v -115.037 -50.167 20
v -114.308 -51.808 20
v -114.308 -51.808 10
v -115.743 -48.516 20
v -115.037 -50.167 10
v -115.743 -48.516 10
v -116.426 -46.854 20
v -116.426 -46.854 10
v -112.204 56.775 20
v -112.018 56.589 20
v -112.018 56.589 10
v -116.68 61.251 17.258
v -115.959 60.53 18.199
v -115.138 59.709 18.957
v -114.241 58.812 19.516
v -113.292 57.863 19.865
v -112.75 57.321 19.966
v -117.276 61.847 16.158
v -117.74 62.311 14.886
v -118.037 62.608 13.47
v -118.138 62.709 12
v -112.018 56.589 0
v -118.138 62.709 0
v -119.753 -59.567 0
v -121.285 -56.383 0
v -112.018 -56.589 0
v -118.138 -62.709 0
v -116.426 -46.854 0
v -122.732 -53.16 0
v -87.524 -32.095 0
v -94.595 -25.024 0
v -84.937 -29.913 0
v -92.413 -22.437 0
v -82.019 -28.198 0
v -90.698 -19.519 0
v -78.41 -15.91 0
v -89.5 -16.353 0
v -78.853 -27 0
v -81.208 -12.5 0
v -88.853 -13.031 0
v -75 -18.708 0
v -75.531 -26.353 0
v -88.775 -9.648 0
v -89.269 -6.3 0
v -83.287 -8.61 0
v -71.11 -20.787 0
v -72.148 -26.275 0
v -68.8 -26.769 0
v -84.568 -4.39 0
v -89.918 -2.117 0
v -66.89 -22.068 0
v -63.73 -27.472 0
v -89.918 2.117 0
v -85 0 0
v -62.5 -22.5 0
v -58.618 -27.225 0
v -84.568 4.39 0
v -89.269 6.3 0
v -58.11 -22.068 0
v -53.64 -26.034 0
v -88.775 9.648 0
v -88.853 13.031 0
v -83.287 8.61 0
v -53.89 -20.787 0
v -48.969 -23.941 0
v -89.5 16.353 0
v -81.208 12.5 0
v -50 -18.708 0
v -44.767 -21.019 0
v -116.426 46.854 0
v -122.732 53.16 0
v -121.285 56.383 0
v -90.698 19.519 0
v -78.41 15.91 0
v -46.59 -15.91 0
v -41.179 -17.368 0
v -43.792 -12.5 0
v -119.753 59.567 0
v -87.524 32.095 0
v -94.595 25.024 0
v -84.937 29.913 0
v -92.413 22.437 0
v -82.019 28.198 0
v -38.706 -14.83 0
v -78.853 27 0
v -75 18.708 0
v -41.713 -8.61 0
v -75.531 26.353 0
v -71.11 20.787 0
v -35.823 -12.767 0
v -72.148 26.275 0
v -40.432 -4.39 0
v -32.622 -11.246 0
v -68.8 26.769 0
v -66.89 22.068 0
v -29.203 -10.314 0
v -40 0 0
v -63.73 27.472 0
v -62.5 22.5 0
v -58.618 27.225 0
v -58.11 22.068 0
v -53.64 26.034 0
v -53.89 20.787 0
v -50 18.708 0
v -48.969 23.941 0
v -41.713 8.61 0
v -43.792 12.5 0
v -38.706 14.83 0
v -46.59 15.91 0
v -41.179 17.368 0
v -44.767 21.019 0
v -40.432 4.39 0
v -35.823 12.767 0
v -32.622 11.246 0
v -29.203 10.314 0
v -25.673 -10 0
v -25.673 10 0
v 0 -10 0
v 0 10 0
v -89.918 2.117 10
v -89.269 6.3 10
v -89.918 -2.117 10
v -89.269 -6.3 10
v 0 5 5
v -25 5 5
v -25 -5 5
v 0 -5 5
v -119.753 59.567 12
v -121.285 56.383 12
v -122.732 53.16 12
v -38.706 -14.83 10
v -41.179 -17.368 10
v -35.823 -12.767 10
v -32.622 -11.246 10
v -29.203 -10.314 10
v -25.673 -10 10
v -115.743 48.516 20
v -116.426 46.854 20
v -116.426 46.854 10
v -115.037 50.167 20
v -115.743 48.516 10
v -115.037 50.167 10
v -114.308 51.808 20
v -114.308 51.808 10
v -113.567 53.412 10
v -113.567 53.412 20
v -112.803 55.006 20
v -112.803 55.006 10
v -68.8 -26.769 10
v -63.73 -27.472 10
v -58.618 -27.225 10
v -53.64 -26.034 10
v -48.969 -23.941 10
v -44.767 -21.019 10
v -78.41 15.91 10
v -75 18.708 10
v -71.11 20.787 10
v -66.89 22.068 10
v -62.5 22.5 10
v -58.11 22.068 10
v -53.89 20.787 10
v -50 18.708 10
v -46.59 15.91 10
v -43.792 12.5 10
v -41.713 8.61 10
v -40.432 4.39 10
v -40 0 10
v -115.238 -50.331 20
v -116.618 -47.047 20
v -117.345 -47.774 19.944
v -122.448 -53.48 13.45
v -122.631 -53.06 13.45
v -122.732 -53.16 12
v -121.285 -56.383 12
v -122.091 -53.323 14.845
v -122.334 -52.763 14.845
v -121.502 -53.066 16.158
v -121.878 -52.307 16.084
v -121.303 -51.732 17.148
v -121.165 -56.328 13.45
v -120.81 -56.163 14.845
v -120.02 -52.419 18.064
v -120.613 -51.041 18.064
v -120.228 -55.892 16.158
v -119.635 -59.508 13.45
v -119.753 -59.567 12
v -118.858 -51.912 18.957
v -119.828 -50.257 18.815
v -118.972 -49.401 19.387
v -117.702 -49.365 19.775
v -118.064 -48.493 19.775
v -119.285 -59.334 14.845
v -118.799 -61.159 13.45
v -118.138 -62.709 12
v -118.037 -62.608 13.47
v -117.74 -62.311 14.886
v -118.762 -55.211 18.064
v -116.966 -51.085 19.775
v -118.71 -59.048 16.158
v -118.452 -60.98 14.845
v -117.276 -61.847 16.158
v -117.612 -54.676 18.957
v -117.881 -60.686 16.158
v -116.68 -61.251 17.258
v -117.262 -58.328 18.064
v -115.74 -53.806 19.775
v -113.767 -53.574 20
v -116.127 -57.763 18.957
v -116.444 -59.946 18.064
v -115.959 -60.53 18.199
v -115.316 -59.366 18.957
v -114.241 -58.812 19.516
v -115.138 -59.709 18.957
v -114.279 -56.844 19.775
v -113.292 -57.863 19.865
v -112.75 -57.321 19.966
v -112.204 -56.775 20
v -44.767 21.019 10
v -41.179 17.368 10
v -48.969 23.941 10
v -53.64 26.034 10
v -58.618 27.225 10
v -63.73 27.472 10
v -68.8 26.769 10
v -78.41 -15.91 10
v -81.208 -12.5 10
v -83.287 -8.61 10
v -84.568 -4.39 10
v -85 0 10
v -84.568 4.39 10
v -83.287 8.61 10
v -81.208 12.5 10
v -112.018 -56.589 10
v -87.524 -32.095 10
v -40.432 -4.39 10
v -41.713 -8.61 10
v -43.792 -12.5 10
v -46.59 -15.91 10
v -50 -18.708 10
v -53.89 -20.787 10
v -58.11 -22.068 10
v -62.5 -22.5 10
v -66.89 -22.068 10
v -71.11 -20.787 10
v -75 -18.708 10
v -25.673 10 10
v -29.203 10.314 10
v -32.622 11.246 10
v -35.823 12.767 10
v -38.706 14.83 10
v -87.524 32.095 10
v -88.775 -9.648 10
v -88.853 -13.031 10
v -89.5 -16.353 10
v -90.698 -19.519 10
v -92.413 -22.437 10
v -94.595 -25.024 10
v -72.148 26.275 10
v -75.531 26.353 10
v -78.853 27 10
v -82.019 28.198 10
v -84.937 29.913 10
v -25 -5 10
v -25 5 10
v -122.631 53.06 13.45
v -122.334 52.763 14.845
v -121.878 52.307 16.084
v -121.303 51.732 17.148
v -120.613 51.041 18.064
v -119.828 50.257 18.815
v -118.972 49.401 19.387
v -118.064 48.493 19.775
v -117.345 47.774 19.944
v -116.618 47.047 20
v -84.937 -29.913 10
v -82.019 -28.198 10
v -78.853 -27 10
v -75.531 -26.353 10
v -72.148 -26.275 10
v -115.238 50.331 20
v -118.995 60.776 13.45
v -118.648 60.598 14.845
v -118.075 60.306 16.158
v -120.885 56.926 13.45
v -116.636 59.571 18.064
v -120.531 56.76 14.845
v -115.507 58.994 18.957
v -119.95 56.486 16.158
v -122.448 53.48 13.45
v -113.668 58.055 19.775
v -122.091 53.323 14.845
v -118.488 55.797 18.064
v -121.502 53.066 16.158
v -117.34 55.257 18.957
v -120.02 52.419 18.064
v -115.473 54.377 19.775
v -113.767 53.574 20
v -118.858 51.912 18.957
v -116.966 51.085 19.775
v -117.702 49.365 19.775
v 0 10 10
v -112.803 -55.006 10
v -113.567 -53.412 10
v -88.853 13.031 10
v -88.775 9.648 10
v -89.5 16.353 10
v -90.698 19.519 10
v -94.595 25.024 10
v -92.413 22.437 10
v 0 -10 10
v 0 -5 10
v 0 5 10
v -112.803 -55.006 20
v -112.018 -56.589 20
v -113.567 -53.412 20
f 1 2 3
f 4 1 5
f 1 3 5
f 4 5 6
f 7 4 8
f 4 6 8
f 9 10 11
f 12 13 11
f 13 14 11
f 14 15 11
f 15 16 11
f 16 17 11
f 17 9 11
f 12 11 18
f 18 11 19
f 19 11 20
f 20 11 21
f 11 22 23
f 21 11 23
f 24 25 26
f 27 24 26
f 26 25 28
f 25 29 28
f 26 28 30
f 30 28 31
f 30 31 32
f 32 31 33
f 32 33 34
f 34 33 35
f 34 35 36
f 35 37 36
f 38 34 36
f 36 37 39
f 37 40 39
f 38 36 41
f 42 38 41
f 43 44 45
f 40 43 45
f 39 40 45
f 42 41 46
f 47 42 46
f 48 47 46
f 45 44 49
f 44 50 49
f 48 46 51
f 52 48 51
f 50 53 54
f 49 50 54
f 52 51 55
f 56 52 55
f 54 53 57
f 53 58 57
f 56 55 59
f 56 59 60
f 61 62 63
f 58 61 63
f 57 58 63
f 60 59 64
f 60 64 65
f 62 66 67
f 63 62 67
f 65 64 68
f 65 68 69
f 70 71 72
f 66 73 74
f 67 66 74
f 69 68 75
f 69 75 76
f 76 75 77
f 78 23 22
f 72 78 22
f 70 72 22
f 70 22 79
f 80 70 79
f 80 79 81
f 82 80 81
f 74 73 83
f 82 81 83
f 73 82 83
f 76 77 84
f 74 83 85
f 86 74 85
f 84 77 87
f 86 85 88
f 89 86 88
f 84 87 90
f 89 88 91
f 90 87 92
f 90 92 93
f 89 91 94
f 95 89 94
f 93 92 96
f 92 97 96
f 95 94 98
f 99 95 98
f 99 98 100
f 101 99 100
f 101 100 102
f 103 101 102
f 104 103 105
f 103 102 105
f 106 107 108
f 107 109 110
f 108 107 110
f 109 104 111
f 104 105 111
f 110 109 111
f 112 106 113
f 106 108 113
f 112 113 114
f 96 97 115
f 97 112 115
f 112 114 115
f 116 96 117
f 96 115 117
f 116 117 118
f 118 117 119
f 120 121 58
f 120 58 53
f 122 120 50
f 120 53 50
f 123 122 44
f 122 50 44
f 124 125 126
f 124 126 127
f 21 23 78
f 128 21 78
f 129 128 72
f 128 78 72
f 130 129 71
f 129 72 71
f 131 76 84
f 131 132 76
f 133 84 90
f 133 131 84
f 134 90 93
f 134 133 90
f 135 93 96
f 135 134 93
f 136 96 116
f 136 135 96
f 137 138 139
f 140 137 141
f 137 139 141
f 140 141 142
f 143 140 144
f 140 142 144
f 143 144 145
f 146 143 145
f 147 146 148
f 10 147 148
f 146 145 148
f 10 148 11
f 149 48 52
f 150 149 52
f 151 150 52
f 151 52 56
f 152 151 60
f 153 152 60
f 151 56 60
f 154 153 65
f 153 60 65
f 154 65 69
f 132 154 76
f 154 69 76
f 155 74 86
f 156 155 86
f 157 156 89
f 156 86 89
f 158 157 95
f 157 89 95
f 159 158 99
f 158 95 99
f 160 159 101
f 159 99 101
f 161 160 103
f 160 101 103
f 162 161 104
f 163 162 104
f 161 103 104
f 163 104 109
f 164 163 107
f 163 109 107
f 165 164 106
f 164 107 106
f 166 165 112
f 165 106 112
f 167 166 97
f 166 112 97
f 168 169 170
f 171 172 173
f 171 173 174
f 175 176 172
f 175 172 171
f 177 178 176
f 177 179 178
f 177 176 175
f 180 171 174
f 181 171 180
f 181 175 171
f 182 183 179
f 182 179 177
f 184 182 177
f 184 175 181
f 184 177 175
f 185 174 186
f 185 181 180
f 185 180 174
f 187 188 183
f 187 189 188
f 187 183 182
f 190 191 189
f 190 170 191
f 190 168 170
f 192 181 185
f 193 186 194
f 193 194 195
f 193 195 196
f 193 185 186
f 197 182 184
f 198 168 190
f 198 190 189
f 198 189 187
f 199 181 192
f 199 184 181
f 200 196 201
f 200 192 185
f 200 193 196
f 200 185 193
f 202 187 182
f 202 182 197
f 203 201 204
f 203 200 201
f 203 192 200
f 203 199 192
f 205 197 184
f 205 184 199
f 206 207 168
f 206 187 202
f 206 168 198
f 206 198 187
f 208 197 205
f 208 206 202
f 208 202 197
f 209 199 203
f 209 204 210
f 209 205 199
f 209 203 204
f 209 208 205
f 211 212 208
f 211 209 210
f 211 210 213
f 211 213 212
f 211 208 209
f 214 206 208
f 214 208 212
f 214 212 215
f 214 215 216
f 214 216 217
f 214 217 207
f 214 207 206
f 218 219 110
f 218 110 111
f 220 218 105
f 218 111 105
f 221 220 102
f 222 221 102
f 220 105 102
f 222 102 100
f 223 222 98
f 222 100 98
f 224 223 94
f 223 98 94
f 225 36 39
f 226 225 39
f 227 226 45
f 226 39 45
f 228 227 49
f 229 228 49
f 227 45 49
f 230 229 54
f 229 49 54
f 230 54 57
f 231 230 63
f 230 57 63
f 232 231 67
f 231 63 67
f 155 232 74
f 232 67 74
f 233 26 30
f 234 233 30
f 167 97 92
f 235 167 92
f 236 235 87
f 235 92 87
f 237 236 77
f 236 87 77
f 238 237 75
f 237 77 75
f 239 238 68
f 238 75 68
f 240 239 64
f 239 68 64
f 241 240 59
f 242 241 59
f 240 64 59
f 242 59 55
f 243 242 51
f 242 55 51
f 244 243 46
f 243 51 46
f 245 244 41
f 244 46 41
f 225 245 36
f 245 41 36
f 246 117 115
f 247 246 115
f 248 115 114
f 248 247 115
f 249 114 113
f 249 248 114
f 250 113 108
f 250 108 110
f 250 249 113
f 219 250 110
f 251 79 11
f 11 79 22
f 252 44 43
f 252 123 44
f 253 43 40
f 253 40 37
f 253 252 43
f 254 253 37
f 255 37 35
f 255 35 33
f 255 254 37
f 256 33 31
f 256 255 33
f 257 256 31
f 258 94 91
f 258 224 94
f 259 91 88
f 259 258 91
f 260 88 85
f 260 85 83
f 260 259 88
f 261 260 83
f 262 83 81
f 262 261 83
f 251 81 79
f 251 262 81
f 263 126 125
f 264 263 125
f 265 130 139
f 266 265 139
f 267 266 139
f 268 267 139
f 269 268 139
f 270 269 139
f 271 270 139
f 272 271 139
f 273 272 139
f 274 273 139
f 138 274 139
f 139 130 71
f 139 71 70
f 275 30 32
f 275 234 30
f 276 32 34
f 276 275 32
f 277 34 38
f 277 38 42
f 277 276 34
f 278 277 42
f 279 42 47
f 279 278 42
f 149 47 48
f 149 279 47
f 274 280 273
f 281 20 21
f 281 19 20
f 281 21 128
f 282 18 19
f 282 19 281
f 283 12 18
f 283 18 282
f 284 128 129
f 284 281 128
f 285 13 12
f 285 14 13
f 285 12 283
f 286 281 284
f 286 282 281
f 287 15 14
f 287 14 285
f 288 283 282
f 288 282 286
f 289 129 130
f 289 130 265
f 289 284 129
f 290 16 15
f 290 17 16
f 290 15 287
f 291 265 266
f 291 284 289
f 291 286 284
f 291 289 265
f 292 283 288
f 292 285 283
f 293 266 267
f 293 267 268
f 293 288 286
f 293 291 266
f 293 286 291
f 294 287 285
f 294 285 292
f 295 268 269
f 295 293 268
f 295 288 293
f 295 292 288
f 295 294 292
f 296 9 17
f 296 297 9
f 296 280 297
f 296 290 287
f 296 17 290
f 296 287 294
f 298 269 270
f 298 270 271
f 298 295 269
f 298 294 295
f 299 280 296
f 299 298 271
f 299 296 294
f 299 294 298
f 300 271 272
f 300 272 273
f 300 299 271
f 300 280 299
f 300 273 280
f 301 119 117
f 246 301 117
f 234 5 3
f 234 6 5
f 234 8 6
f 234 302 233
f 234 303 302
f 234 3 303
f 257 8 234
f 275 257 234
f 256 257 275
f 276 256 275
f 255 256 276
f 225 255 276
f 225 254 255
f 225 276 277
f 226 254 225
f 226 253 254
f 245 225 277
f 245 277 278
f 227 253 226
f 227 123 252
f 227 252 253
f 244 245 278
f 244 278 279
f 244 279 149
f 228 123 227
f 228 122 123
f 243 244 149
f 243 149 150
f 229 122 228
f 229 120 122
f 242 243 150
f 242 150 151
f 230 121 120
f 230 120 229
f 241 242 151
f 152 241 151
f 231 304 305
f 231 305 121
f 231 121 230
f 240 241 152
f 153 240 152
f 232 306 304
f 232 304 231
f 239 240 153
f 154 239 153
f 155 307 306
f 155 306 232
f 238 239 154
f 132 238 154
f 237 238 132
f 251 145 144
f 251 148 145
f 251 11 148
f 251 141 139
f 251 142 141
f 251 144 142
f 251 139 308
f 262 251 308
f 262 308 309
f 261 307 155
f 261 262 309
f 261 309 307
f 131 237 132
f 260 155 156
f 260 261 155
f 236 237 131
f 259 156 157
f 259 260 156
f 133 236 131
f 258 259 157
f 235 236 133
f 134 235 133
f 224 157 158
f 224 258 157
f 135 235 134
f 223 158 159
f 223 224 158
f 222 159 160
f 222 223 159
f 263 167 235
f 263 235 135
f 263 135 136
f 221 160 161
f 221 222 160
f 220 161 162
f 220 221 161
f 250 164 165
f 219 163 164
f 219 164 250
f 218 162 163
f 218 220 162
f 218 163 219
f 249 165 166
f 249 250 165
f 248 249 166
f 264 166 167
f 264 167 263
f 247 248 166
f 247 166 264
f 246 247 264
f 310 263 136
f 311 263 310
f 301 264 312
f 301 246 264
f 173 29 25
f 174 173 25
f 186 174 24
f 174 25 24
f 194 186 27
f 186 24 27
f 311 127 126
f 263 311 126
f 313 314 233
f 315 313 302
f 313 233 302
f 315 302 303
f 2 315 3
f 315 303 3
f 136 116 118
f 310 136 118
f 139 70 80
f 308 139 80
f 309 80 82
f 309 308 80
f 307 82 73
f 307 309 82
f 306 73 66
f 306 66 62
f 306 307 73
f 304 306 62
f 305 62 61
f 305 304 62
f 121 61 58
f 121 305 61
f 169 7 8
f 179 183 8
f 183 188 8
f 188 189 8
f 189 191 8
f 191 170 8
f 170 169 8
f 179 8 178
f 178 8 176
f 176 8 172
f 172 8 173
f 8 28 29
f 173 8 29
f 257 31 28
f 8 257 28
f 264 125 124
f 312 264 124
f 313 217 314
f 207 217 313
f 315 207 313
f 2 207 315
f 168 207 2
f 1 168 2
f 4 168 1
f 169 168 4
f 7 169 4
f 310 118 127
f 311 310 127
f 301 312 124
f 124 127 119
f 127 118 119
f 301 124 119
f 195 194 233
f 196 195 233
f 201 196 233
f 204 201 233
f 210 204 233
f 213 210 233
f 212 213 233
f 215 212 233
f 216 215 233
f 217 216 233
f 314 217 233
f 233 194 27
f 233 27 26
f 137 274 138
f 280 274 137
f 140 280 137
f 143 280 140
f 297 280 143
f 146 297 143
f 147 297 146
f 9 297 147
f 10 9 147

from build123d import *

# Parameters (mm, degrees)
F1_DEPTH = 10
F2_R     = 20
F3_DEPTH = 20
F0_W     = 25
F0_H     = 10
F4_DEPTH = 5
F5_R     = 8


with BuildPart() as f1:
    # F0 (on Top) → F1 (new body)
    with BuildSketch(Plane.XY):
        with BuildLine():
            Line((0, 10), (-36.8826230851, 10))
            ThreePointArc((-36.8826230851, 10), (-35.4747537924, 5.0878352391), (-35, 0))
            ThreePointArc((-35, 0), (-35.4747537924, -5.0878352391), (-36.8826230851, -10))
            Line((-36.8826230851, -10), (0, -10))
            Line((0, -10), (0, -5))
            Line((0, -5), (-25, -5))
            Line((-25, -5), (-25, 5))
            Line((-25, 5), (0, 5))
            Line((0, 5), (0, 10))
        make_face()
        with BuildLine():
            Line((-114.3075854453, 51.8075854453), (-81.9454364826, 19.4454364826))
            ThreePointArc((-81.9454364826, 19.4454364826), (-80.0890590993, 21.1394181566), (-78.08578927, 22.6568570819))
            Line((-78.08578927, 22.6568570819), (-112.0176888624, 56.5887566742))
            ThreePointArc((-112.0176888624, 56.5887566742), (-113.1878851609, 54.2102633531), (-114.3075854453, 51.8075854453))
        make_face()
        with BuildLine():
            ThreePointArc((-85.1568570819, 15.58578927), (-83.6394181566, 17.5890590993), (-81.9454364826, 19.4454364826))
            Line((-81.9454364826, 19.4454364826), (-114.3075854453, 51.8075854453))
            ThreePointArc((-114.3075854453, 51.8075854453), (-115.3931446982, 49.3423971515), (-116.4255463439, 46.8544785321))
            Line((-116.4255463439, 46.8544785321), (-85.1568570819, 15.58578927))
        make_face()
        with BuildLine():
            ThreePointArc((-78.4099025767, 15.9099025767), (-53.8896227718, 20.7872894815), (-40, 0))
            ThreePointArc((-40, 0), (-53.8896227718, -20.7872894815), (-78.4099025767, -15.9099025767))
            Line((-78.4099025767, -15.9099025767), (-81.9454364826, -19.4454364826))
            ThreePointArc((-81.9454364826, -19.4454364826), (-80.0890590993, -21.1394181566), (-78.08578927, -22.6568570819))
            ThreePointArc((-78.08578927, -22.6568570819), (-54.424902758, -26.2876930242), (-36.8826230851, -10))
            ThreePointArc((-36.8826230851, -10), (-35.4747537924, -5.0878352391), (-35, 0))
            ThreePointArc((-35, 0), (-35.4747537924, 5.0878352391), (-36.8826230851, 10))
            ThreePointArc((-36.8826230851, 10), (-54.424902758, 26.2876930242), (-78.08578927, 22.6568570819))
            ThreePointArc((-78.08578927, 22.6568570819), (-80.0890590993, 21.1394181566), (-81.9454364826, 19.4454364826))
            Line((-81.9454364826, 19.4454364826), (-78.4099025767, 15.9099025767))
        make_face()
        with BuildLine():
            ThreePointArc((-78.4099025767, -15.9099025767), (-85, 0), (-78.4099025767, 15.9099025767))
            Line((-78.4099025767, 15.9099025767), (-81.9454364826, 19.4454364826))
            ThreePointArc((-81.9454364826, 19.4454364826), (-83.6394181566, 17.5890590993), (-85.1568570819, 15.58578927))
            ThreePointArc((-85.1568570819, 15.58578927), (-90, 0), (-85.1568570819, -15.58578927))
            ThreePointArc((-85.1568570819, -15.58578927), (-83.6394181566, -17.5890590993), (-81.9454364826, -19.4454364826))
            Line((-81.9454364826, -19.4454364826), (-78.4099025767, -15.9099025767))
        make_face()
        with BuildLine():
            Line((-114.3075854453, -51.8075854453), (-81.9454364826, -19.4454364826))
            ThreePointArc((-81.9454364826, -19.4454364826), (-83.6394181566, -17.5890590993), (-85.1568570819, -15.58578927))
            Line((-85.1568570819, -15.58578927), (-116.4255463439, -46.8544785321))
            ThreePointArc((-116.4255463439, -46.8544785321), (-115.3931446982, -49.3423971515), (-114.3075854453, -51.8075854453))
        make_face()
        with BuildLine():
            ThreePointArc((-78.08578927, -22.6568570819), (-80.0890590993, -21.1394181566), (-81.9454364826, -19.4454364826))
            Line((-81.9454364826, -19.4454364826), (-114.3075854453, -51.8075854453))
            ThreePointArc((-114.3075854453, -51.8075854453), (-113.1878851609, -54.2102633531), (-112.0176888624, -56.5887566742))
            Line((-112.0176888624, -56.5887566742), (-78.08578927, -22.6568570819))
        make_face()
        with BuildLine():
            ThreePointArc((-112.0176888624, -56.5887566742), (-113.1878851609, -54.2102633531), (-114.3075854453, -51.8075854453))
            ThreePointArc((-114.3075854453, -51.8075854453), (-115.3931446982, -49.3423971515), (-116.4255463439, -46.8544785321))
            Line((-116.4255463439, -46.8544785321), (-122.731528021, -53.1604602091))
            ThreePointArc((-122.731528021, -53.1604602091), (-120.5294282278, -57.98033659), (-118.1381334557, -62.7092012675))
            Line((-118.1381334557, -62.7092012675), (-112.0176888624, -56.5887566742))
        make_face()
        with BuildLine():
            ThreePointArc((-116.4255463439, 46.8544785321), (-115.3931446982, 49.3423971515), (-114.3075854453, 51.8075854453))
            ThreePointArc((-114.3075854453, 51.8075854453), (-113.1878851609, 54.2102633531), (-112.0176888624, 56.5887566742))
            Line((-112.0176888624, 56.5887566742), (-118.1381334557, 62.7092012675))
            ThreePointArc((-118.1381334557, 62.7092012675), (-120.5294282278, 57.98033659), (-122.731528021, 53.1604602091))
            Line((-122.731528021, 53.1604602091), (-116.4255463439, 46.8544785321))
        make_face()
    extrude(amount=F1_DEPTH)

    # F2
    f2_edges = [f1.edges().sort_by_distance(p)[0] for p in [
        (-78.085789, -22.656857, 5),
        (-36.882623, -10, 5),
        (-36.882623, 10, 5),
        (-78.085789, 22.656857, 5),
        (-85.156857, -15.585789, 5),
        (-85.156857, 15.585789, 5),
    ]]
    fillet(f2_edges, radius=F2_R)

    # F0 (on Top) → F3 (join)
    with BuildSketch(Plane.XY):
        with BuildLine():
            ThreePointArc((-116.4255463439, 46.8544785321), (-115.3931446982, 49.3423971515), (-114.3075854453, 51.8075854453))
            ThreePointArc((-114.3075854453, 51.8075854453), (-113.1878851609, 54.2102633531), (-112.0176888624, 56.5887566742))
            Line((-112.0176888624, 56.5887566742), (-118.1381334557, 62.7092012675))
            ThreePointArc((-118.1381334557, 62.7092012675), (-120.5294282278, 57.98033659), (-122.731528021, 53.1604602091))
            Line((-122.731528021, 53.1604602091), (-116.4255463439, 46.8544785321))
        make_face()
        with BuildLine():
            ThreePointArc((-112.0176888624, -56.5887566742), (-113.1878851609, -54.2102633531), (-114.3075854453, -51.8075854453))
            ThreePointArc((-114.3075854453, -51.8075854453), (-115.3931446982, -49.3423971515), (-116.4255463439, -46.8544785321))
            Line((-116.4255463439, -46.8544785321), (-122.731528021, -53.1604602091))
            ThreePointArc((-122.731528021, -53.1604602091), (-120.5294282278, -57.98033659), (-118.1381334557, -62.7092012675))
            Line((-118.1381334557, -62.7092012675), (-112.0176888624, -56.5887566742))
        make_face()
    extrude(amount=F3_DEPTH)

    # F0 (on Top) → F4 (join)
    with BuildSketch(Plane.XY):
        with Locations((-12.5, 0)):
            Rectangle(F0_W, F0_H)
    extrude(amount=F4_DEPTH)

    # F5
    f5_edges = [f1.edges().sort_by_distance(p)[0] for p in [
        (-120.529428, -57.980337, 20),
        (-120.529428, 57.980337, 20),
    ]]
    fillet(f5_edges, radius=F5_R)


solid = f1.part
